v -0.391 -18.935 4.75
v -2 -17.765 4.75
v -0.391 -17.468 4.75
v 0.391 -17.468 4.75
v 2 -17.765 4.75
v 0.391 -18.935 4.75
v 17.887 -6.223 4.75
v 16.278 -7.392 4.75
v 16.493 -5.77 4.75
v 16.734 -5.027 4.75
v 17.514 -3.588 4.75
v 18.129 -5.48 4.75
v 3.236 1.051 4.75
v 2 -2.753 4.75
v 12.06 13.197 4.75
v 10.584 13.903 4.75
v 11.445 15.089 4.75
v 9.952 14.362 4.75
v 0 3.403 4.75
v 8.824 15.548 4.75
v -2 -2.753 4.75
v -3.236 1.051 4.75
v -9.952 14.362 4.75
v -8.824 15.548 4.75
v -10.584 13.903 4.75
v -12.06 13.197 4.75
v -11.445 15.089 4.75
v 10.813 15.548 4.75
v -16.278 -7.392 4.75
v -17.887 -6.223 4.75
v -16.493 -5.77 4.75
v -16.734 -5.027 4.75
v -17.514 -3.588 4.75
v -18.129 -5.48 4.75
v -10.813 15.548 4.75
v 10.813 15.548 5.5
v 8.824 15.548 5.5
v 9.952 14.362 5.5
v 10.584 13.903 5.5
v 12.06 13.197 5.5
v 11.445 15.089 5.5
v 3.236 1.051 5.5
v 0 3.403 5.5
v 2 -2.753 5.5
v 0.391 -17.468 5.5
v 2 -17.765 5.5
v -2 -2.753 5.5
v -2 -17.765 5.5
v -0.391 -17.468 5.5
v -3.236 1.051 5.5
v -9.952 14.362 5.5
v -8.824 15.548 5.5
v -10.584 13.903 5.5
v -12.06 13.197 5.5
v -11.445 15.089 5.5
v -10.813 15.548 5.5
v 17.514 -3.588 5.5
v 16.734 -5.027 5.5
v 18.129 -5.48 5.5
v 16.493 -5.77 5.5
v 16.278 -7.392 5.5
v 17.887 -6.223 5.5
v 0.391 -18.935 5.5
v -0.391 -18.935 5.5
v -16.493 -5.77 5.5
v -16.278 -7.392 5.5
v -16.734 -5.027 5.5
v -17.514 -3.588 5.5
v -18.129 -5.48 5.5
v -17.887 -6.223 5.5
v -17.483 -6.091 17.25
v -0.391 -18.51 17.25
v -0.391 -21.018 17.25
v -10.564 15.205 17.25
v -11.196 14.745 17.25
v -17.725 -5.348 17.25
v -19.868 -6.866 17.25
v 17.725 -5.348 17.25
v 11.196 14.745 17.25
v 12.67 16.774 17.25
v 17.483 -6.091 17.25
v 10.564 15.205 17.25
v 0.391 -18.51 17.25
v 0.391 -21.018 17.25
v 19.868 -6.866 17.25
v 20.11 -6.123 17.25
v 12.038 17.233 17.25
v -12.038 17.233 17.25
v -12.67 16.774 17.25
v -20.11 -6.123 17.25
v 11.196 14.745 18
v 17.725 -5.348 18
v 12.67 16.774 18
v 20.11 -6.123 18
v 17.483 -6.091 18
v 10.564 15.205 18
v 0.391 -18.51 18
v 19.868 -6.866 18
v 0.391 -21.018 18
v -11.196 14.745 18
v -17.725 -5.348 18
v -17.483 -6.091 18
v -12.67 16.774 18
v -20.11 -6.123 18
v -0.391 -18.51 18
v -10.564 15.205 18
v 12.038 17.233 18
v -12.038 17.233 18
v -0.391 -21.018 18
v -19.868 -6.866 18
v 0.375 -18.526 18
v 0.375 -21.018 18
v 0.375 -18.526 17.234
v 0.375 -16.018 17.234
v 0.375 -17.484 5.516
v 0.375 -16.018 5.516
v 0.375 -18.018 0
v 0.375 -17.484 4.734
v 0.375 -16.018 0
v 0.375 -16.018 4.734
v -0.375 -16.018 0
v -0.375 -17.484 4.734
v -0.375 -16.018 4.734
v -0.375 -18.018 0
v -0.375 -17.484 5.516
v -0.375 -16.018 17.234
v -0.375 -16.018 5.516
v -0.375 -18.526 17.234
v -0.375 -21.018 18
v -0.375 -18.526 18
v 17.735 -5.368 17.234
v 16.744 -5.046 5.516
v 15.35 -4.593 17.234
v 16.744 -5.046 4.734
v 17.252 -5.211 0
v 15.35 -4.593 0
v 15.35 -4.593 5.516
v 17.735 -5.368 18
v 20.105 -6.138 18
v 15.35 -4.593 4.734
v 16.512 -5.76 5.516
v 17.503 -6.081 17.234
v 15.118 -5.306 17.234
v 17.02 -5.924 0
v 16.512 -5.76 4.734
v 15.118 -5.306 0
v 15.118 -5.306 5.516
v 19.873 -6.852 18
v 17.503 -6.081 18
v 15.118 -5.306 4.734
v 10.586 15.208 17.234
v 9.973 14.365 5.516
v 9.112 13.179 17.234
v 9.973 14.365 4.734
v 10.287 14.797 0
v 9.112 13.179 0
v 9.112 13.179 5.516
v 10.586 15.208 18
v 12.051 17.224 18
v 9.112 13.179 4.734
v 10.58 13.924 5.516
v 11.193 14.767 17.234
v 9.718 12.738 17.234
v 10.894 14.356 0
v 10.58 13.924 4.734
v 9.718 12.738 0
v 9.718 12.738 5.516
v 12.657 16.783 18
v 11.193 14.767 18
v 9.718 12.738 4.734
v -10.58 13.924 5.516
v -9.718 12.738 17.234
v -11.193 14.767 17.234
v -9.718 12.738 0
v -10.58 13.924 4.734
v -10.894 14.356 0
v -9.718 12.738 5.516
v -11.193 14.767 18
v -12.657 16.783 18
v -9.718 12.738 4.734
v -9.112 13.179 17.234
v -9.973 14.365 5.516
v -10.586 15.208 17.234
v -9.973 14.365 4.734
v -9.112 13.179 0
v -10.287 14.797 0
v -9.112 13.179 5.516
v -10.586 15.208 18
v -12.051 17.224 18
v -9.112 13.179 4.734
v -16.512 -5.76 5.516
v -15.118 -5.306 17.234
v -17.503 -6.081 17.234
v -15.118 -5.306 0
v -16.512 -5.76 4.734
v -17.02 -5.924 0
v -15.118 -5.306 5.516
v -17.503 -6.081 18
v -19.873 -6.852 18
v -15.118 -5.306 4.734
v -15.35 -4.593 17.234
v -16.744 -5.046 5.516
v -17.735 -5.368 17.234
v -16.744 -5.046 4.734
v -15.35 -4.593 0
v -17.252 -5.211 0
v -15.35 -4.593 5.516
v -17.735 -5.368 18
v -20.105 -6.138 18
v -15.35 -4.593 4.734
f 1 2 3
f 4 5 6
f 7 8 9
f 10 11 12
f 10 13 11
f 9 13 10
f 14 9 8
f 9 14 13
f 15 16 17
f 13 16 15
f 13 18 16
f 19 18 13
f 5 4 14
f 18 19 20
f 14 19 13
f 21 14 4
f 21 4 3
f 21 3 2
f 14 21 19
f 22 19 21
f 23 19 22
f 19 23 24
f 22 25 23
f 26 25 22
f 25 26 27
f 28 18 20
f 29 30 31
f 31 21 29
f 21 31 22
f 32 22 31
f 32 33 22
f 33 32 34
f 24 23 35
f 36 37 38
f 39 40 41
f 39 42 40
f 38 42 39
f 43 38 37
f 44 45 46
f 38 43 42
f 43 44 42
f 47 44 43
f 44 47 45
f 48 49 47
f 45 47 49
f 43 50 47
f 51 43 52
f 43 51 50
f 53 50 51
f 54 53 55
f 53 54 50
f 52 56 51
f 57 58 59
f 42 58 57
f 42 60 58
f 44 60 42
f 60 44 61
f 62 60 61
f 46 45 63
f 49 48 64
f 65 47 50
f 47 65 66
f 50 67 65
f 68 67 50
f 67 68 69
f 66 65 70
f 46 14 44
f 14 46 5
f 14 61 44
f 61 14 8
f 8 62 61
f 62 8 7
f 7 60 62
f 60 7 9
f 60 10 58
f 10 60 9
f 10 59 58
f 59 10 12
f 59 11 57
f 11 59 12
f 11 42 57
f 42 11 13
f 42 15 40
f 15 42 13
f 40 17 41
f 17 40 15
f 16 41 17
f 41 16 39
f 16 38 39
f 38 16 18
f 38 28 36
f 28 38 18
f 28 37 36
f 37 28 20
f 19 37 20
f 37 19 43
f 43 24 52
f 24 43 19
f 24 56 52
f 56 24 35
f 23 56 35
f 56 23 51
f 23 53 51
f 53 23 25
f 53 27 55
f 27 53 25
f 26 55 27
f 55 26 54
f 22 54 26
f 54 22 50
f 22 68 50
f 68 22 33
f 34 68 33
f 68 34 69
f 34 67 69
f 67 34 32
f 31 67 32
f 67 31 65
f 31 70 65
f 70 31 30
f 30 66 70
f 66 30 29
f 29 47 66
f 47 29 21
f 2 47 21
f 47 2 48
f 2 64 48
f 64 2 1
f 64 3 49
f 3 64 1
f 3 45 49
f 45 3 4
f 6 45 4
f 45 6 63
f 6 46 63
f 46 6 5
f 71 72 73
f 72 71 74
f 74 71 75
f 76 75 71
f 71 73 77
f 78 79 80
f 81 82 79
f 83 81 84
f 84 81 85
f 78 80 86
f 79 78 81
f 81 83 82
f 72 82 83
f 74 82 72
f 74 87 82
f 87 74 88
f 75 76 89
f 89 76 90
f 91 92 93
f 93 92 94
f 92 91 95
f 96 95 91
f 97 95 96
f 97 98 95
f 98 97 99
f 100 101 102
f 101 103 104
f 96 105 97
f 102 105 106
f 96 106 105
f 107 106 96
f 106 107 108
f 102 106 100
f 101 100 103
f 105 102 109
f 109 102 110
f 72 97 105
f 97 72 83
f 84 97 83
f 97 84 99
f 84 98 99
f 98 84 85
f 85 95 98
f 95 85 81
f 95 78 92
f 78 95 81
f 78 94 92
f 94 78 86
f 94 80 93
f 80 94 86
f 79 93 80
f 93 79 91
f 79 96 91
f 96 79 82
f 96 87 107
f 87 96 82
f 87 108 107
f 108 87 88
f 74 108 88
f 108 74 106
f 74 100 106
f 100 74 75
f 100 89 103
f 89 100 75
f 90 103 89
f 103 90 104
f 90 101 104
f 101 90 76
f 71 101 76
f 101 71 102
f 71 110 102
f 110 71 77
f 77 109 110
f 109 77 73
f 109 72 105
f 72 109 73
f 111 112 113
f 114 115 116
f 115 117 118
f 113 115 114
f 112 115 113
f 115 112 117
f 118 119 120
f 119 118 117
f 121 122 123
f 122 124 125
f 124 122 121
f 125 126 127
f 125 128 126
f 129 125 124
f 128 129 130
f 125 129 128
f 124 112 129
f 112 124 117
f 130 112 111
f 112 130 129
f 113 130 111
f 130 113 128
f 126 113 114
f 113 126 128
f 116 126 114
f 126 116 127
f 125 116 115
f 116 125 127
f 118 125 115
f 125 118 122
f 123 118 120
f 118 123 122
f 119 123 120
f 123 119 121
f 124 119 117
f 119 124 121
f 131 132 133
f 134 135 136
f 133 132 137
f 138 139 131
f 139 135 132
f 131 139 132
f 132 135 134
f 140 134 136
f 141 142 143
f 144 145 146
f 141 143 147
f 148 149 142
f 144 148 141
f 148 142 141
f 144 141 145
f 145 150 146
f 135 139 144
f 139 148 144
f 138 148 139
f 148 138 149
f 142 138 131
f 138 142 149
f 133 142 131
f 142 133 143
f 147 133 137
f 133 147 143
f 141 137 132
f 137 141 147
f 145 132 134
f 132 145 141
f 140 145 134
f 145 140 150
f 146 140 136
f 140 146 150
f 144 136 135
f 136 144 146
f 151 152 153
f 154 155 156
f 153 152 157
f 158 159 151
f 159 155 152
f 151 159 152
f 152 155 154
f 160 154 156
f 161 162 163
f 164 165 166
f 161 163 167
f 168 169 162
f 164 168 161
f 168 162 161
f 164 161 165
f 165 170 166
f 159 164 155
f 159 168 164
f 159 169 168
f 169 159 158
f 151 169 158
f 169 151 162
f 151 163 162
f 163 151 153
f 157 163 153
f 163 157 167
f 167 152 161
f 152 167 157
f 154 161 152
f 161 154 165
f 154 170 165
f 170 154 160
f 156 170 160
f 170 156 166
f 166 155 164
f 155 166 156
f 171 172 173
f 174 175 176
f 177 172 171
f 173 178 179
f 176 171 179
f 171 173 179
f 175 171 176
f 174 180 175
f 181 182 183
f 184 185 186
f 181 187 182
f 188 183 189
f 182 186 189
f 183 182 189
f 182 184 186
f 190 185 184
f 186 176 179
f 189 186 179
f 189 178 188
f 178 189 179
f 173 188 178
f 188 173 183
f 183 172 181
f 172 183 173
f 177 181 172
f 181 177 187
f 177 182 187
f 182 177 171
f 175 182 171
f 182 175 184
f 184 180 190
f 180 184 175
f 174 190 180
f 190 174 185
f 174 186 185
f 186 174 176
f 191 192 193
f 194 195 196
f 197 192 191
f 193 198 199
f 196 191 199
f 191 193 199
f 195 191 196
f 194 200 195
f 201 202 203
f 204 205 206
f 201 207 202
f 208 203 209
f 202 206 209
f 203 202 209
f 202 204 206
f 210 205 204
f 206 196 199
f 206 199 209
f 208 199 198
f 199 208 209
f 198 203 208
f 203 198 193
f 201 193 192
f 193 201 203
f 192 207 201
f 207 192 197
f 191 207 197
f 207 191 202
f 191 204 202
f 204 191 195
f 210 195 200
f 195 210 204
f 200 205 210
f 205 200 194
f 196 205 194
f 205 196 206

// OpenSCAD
// file: ../src/functions.scad
module shelf(type, diameter,leg_width) {
    if (type == 0)
    round_shelf(diameter, leg_width);
    if (type == 1)
    square_shelf(diameter, leg_width);
    if (type == 2)
    square_shelf_leg_supports(diameter, leg_width);
}

module round_shelf(diameter,leg_width) {
    difference() {
        circle(d=diameter);
        leg_slots(diameter, leg_width);
    }
}

module square_shelf(diameter,leg_width) {
    difference() {
        hull() {
            leg_slots(diameter, leg_width);
        }
        leg_slots(diameter, leg_width);
    }
}

module square_shelf_leg_supports(diameter,leg_width) {
    intersection() {
        square_shelf(diameter, leg_width);
        for(i=[0:leg_count-1]) {
            rotate(i*360/leg_count)
            translate([-leg_support/2,-diameter/2])
            square([leg_support,diameter/2]);
        }
    }
}


module leg_slots(diameter, leg_width) {
    for(i=[0:leg_count-1]) {
        rotate(i*360/leg_count)
        translate([-leg_thick/2-gap,-diameter/2])
        square([leg_thick+gapp,leg_width]);
    }
}

module shelf_number(i) {
        shelf(shelves[i], tan(leg_angle)*((top_height-leg_height)/(shelf_count-1)*i+leg_height)*2+bottom,(tan(leg_angle)*((top_height-leg_height)/(shelf_count-1)*i+leg_height)+min_leg)/2+gap/2);
}

module assemble_shelves() {
    for(i=[0:shelf_count-1]) {
        translate([0,0,(top_height-leg_height)/(shelf_count-1)*i+leg_height-plywood])
        linear_extrude(height=plywood)
        shelf_number(i);
    }
}

module assemble_legs() {
    for(i=[0:leg_count-1]) {
        rotate(i*360/leg_count)
        translate([-leg_thick/2-plywood/2,0,0])
        for(l=[1:leg_layers]) {
            translate([plywood*l,0,0])
            leg_3d();
        }
    }
}

//shelf(bottom,min_leg);

module leg() {
    difference() {
        square([min_leg+(top-bottom)/2,top_height]);
        translate([min_leg,0])
        rotate(-leg_angle)
        square([min_leg+(top-bottom),top_height*2]);
        for(i=[0:shelf_count-1]) {
            translate([0,(top_height-leg_height)/(shelf_count-1)*i+leg_height-plywood-gap])
            square([(tan(leg_angle)*((top_height-leg_height)/(shelf_count-1)*i+leg_height)+min_leg)/2+gap/2,plywood+gapp]);
        }
            
    }
}

module leg_3d() {
    translate([0,-bottom/2+min_leg,0])
    rotate([90,0,-90])
    translate([0,0,-plywood/2])
    color("lime")
    linear_extrude(height=plywood)
    leg();
}

module assemble() {
    assemble_shelves();
    assemble_legs();
}

module plate() {
    for(i=[0:leg_count/2-1]) {
        translate([i*((top-bottom)/2+min_leg*2+tree*2),0]) {
            leg();
            translate([min_leg+(top-bottom)/2+tree+min_leg,top_height])
            rotate(180)
            leg();
        }
    }
    if(leg_count%2 != 0) {
            translate([floor(leg_count/2)*((top-bottom)/2+min_leg*2+tree*2),0])
            leg();
    }
    translate([0,-top/2-tree])
    for(i=[0:shelf_count-1]) {
        //too much math, I can drag in inkscape
        translate([top*i,0])
        shelf_number(i);
    }
}
// main file
include <../src/functions.scad>;

//square_top=30;
square_top=30+sin($t*360)*15;
shelves = [2, 1];
// 0 = round
// 1 = square
// 2 = leg_supports (square)
shelf_count = len(shelves);
leg_layers=1;
leg_count = 5;
leg_height = 5.5; // bottom shelf
top_height = 18; //top to ground
min_leg = 2; //smallest size a leg can be
plywood = 0.75;
gap = 1/64;
gapp = gap*2;
pad = 0.1;
padd = pad*2;
leg_thick=plywood*leg_layers;

leg_support=4;

tree=2;

top = sqrt(2*pow((square_top/2),2))*2-leg_thick/2-gap; //diameter
bottom = top-6; //diameter
leg_angle = atan((top-bottom)/2/top_height);
echo("top is", top);

$fn=120;


// RENDER gif
module demo() {
    assemble();
}

demo();
